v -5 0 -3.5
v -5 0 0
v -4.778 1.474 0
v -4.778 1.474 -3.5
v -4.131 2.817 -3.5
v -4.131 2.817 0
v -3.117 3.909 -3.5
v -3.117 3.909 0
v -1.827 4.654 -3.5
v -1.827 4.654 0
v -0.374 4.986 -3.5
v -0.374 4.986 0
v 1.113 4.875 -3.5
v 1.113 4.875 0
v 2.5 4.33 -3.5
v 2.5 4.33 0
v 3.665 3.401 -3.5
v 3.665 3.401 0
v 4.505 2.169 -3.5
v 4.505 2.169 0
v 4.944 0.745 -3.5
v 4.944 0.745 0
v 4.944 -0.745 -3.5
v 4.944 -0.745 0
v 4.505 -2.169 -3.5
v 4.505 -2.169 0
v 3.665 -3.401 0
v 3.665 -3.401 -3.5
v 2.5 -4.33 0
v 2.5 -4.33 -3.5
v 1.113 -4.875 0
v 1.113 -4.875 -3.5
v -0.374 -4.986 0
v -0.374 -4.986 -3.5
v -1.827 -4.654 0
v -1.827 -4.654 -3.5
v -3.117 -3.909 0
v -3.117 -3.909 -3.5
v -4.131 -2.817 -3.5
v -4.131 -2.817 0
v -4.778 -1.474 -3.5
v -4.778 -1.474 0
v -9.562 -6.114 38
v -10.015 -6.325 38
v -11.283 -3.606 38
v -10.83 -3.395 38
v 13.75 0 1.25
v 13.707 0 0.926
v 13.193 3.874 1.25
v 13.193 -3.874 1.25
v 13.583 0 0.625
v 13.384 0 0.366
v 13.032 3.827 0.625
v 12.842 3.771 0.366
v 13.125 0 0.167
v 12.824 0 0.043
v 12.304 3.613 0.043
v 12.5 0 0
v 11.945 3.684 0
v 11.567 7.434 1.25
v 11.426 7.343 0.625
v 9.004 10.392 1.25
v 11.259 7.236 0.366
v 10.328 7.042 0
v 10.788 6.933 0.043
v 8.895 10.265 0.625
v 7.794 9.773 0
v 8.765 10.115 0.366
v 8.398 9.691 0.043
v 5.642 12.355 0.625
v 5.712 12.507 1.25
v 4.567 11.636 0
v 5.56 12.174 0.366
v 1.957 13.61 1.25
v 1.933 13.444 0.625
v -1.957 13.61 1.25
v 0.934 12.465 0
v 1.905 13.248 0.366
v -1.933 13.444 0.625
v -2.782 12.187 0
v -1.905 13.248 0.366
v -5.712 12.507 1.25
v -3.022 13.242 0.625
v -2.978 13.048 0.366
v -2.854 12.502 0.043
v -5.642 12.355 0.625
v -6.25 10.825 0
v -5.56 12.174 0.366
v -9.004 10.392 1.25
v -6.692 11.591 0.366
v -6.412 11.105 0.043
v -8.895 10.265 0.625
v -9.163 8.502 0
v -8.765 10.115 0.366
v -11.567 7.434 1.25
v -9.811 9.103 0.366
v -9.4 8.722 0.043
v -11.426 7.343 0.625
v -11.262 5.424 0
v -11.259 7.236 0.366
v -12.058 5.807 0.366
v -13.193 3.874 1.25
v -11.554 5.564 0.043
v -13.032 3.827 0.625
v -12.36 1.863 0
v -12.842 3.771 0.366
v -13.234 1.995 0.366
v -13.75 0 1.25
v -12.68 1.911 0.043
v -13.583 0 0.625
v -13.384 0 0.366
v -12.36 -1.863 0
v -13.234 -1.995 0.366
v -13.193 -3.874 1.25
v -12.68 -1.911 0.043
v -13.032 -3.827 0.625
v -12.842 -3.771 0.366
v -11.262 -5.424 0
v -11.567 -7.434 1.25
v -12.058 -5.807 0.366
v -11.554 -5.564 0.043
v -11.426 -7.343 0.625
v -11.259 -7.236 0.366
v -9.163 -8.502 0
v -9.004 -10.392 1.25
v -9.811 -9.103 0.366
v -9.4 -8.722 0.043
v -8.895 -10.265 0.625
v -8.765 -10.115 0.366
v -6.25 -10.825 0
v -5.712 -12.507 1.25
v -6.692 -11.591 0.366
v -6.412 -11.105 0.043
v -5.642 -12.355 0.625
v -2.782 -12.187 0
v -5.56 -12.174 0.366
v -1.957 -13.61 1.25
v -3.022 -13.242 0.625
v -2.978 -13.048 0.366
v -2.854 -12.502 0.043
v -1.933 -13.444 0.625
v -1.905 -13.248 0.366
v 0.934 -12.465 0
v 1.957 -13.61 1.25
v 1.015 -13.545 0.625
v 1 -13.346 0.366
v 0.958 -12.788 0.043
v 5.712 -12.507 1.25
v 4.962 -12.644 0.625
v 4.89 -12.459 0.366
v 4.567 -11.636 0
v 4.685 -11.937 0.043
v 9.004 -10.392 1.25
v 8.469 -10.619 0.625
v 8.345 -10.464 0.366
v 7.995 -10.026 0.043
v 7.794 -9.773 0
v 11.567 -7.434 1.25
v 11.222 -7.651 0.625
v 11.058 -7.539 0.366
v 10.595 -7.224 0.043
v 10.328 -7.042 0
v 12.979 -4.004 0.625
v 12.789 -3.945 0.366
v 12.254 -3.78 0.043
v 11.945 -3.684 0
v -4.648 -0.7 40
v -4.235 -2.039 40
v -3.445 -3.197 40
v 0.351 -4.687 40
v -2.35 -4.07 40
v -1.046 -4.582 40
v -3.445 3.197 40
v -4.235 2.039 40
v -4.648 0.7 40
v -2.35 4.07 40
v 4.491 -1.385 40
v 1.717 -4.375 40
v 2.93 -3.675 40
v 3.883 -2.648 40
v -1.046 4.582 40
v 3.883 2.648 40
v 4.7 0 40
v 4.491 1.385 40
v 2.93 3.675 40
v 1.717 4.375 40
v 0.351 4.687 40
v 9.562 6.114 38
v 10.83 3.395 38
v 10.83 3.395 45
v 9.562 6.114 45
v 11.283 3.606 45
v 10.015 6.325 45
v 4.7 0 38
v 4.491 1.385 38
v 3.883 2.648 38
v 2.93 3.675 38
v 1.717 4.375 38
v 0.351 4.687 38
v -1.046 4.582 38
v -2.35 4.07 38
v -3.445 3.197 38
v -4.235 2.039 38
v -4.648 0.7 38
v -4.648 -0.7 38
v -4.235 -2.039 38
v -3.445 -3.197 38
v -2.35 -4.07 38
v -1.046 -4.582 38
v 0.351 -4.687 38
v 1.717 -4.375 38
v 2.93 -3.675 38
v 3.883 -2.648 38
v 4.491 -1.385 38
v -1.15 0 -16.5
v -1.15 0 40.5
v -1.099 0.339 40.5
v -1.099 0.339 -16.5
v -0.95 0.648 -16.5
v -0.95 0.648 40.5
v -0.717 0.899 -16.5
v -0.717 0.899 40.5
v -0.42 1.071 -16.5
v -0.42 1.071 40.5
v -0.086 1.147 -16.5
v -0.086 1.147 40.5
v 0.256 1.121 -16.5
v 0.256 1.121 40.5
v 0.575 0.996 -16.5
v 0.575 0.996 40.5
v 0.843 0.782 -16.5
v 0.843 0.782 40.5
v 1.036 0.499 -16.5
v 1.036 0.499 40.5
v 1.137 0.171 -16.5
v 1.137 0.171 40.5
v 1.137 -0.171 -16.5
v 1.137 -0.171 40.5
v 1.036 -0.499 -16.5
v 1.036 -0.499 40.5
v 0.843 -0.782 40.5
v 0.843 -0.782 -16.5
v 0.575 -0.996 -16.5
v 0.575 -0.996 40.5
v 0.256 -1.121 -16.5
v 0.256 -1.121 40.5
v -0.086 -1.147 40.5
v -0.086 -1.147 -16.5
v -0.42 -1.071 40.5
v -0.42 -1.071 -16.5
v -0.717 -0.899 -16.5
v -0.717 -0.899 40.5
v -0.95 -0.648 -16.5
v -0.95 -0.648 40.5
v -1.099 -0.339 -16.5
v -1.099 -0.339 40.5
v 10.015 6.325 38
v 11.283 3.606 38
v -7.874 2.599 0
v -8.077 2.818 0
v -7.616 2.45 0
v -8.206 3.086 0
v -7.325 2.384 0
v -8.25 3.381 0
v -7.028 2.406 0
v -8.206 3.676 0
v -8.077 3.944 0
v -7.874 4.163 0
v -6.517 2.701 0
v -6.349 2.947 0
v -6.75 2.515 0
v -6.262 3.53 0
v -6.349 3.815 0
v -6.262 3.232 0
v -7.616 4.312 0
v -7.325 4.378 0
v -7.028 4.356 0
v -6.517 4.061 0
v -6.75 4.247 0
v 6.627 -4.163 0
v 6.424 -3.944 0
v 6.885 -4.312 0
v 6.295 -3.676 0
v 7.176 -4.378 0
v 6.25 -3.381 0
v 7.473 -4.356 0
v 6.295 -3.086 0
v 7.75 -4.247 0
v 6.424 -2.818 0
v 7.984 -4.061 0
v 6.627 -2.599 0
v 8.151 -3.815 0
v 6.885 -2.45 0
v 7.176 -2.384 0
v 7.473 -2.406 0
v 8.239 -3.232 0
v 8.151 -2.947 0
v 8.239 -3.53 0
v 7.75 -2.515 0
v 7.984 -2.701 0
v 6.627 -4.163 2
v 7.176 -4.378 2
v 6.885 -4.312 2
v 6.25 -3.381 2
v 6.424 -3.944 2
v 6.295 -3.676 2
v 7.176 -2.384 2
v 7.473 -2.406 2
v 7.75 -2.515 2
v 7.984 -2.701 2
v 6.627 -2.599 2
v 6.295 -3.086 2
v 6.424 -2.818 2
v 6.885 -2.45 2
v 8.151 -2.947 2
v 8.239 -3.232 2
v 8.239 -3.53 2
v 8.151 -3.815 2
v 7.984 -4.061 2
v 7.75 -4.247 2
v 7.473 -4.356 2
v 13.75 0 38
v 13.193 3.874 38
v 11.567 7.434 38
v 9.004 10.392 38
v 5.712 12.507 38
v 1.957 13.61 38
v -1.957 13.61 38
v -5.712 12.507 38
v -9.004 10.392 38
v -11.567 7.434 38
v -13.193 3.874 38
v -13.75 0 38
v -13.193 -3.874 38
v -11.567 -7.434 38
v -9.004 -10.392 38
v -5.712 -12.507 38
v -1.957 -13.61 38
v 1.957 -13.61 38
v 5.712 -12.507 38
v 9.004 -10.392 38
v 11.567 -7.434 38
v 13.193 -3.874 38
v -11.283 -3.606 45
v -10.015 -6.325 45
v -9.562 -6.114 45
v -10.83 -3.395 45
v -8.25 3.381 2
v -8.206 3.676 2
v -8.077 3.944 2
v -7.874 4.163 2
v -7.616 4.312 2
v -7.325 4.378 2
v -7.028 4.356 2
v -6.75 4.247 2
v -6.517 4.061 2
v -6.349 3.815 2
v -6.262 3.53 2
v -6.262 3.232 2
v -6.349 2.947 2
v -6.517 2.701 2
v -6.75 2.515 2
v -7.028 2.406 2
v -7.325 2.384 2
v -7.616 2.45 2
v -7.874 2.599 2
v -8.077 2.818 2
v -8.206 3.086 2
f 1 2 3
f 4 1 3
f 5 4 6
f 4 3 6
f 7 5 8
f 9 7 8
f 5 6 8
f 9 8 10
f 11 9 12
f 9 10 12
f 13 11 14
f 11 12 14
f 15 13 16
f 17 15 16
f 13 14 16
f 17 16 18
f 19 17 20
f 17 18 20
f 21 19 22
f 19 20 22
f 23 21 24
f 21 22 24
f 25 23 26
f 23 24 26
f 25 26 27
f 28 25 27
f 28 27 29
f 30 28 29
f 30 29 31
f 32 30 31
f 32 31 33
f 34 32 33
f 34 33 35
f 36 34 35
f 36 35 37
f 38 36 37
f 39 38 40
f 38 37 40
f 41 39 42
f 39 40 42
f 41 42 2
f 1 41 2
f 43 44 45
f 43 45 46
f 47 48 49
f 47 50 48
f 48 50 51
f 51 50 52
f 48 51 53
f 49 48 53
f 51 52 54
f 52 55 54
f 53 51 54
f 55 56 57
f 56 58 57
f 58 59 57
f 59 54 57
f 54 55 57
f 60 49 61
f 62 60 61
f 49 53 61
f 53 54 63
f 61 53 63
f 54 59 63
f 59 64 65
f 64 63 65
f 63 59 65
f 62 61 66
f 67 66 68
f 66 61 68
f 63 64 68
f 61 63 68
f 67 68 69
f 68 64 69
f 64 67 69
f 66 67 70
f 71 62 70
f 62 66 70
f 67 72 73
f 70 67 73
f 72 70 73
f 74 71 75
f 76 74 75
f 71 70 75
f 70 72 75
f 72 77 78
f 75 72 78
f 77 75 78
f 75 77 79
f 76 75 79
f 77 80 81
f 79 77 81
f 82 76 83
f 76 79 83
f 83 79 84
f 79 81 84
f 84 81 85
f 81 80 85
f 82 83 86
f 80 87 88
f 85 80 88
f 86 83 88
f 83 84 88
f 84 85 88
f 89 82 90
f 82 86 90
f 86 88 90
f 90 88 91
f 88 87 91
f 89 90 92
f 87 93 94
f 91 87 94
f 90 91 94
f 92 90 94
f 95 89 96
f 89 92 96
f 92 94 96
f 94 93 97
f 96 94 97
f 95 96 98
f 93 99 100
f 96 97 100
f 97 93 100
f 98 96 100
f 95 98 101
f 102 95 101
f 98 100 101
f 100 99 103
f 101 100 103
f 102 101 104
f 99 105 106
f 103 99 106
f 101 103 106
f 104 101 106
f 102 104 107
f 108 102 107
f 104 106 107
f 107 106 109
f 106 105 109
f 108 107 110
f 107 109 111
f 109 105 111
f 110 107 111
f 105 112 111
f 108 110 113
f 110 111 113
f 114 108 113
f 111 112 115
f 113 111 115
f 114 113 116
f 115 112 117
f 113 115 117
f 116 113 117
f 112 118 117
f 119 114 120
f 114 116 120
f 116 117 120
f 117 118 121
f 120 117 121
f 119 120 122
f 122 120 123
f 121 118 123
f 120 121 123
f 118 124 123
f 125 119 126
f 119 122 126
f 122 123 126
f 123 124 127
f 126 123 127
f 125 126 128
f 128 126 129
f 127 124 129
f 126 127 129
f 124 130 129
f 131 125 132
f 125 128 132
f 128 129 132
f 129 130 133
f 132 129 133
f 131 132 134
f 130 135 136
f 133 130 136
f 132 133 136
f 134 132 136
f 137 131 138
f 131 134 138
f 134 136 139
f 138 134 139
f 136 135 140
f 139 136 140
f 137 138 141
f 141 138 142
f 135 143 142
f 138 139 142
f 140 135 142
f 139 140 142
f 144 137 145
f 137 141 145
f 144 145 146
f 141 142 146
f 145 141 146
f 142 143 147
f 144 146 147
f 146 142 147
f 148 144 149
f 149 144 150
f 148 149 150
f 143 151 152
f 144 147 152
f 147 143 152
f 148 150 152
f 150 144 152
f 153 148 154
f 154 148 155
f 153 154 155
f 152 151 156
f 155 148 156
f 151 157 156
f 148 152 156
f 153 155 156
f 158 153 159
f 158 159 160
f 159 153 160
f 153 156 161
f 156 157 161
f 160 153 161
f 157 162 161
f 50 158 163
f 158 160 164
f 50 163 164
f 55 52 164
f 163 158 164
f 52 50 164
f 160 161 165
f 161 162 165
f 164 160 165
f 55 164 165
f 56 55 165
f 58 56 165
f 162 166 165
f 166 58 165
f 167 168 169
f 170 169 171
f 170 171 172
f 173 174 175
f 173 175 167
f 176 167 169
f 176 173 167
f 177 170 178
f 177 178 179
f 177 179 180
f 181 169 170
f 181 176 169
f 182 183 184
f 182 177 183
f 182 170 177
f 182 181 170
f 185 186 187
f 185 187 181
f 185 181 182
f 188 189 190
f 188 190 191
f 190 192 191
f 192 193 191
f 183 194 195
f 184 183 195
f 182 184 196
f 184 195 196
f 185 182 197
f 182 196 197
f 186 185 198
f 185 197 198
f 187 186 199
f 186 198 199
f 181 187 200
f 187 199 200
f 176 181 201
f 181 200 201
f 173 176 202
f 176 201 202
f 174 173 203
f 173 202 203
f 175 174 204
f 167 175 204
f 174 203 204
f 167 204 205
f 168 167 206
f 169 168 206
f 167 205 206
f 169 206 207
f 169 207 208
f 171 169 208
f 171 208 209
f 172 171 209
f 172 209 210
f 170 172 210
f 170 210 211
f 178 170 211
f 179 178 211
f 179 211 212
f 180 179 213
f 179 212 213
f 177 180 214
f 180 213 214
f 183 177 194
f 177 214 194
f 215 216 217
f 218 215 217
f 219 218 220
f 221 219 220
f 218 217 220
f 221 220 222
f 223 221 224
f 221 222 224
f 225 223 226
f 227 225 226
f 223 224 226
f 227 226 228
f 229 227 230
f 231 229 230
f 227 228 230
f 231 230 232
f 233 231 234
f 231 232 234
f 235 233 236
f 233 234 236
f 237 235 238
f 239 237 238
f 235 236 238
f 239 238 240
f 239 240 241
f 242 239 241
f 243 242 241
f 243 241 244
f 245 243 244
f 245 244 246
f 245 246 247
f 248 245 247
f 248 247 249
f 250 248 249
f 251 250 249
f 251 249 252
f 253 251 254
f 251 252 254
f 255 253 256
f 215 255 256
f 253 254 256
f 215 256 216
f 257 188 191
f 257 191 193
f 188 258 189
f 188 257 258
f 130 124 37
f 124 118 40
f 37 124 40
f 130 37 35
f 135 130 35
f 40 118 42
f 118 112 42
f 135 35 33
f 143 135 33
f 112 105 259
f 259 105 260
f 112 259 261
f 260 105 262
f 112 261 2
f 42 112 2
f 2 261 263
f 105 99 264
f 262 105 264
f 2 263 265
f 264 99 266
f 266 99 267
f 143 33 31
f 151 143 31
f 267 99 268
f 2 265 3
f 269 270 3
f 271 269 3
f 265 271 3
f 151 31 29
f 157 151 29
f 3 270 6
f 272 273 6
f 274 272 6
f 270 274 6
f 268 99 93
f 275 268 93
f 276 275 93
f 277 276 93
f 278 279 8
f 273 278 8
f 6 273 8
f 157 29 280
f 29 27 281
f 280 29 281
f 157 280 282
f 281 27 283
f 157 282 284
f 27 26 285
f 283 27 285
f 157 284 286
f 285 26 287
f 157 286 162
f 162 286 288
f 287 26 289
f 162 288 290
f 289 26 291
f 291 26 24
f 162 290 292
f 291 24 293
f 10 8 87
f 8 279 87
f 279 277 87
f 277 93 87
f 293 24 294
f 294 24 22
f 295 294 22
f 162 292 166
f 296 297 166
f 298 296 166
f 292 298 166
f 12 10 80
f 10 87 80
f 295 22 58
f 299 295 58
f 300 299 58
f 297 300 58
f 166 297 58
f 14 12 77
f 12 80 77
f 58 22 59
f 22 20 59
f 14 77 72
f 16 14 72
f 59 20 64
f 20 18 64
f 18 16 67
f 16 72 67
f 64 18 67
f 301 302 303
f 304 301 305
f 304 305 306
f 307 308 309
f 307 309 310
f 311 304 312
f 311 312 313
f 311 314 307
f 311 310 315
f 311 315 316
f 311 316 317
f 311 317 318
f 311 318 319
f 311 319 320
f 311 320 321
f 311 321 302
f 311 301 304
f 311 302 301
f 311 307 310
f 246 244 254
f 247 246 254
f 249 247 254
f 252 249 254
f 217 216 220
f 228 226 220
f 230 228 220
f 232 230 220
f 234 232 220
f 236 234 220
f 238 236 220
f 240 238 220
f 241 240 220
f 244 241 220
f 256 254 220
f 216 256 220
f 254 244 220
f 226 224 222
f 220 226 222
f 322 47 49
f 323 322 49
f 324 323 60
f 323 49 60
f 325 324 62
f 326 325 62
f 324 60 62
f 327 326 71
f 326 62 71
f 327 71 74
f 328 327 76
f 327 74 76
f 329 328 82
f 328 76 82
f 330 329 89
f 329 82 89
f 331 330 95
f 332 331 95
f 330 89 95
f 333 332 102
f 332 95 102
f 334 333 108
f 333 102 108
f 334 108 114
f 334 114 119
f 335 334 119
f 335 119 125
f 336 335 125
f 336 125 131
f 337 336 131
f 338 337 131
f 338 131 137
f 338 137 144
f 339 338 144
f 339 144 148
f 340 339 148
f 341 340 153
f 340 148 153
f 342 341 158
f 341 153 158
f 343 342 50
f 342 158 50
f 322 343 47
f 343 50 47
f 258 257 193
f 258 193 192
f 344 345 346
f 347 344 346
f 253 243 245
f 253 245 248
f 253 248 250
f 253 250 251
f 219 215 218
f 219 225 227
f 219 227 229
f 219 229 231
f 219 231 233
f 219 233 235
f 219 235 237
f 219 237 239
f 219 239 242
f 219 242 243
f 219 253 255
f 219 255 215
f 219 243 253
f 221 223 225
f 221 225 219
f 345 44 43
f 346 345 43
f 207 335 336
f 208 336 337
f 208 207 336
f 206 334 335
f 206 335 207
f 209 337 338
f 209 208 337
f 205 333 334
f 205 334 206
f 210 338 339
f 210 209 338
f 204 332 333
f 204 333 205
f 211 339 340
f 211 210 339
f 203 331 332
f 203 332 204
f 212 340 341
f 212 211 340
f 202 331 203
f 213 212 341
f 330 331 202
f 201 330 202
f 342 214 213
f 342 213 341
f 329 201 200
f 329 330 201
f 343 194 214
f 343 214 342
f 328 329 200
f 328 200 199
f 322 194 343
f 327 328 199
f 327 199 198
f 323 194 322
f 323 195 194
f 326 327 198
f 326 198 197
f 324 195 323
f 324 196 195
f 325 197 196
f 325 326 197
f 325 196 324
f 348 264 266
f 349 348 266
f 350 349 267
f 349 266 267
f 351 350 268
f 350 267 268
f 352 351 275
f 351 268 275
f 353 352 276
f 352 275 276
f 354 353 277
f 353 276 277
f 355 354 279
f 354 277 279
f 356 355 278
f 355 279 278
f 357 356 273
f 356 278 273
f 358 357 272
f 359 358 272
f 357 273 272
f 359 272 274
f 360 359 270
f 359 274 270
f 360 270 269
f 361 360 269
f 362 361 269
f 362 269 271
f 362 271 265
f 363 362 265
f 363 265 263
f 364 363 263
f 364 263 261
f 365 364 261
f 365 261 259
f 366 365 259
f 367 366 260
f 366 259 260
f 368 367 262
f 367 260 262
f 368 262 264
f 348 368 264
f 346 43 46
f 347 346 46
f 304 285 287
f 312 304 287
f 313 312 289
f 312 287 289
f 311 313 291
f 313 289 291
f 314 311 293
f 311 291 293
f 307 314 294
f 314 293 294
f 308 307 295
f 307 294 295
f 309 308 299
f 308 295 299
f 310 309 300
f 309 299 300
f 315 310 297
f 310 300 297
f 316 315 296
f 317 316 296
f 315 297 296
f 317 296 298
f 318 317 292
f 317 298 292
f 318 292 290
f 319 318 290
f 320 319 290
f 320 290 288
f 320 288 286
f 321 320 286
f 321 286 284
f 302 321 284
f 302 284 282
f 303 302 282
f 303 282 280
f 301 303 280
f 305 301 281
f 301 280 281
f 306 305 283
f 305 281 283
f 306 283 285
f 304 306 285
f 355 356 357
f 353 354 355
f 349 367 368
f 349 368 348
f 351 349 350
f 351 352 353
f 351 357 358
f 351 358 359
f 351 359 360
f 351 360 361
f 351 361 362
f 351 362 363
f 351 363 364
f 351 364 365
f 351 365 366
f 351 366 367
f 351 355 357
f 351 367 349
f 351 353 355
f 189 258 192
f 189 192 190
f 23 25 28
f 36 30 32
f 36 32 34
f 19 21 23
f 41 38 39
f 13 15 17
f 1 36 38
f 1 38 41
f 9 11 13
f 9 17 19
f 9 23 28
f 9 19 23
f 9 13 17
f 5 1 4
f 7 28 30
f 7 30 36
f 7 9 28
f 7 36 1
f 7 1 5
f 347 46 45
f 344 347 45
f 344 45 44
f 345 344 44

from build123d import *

# Parameters (mm, degrees)
SKIZZE2_R                            = 13.75
AUFSATZ_LINEAR_AUSTRAGEN1_DEPTH      = 38
SKIZZE3_R                            = 5
AUFSATZ_LINEAR_AUSTRAGEN2_DEPTH      = 3.5
SKIZZE4_R                            = 4.7
AUFSATZ_LINEAR_AUSTRAGEN3_DEPTH      = 2
AUFSATZ_LINEAR_AUSTRAGEN4_DEPTH      = 13
AUFSATZ_LINEAR_AUSTRAGEN4_DEPTH_BACK = 44
SKIZZE5_R                            = 1.15
SKIZZE6_R                            = 1
SCHNITT_LINEAR_AUSTRAGEN1_DEPTH      = 2
AUFSATZ_LINEAR_AUSTRAGEN5_DEPTH      = 7
AUFSATZ_LINEAR_AUSTRAGEN5_2_DEPTH    = 7
VERRUNDUNG1_R                        = 1.25


with BuildPart() as part:
    # Skizze2 → Aufsatz-Linear austragen1 (new body)
    with BuildSketch(Plane.XY):
        Circle(SKIZZE2_R)
    extrude(amount=AUFSATZ_LINEAR_AUSTRAGEN1_DEPTH)

    # Skizze3 → Aufsatz-Linear austragen2 (add)
    with BuildSketch(Plane(origin=(0, 0, 0), x_dir=(-1, 0, 0), z_dir=(0, 0, -1))):
        Circle(SKIZZE3_R)
    extrude(amount=AUFSATZ_LINEAR_AUSTRAGEN2_DEPTH)

    # Skizze4 → Aufsatz-Linear austragen3 (add)
    with BuildSketch(Plane.XY.offset(38)):
        Circle(SKIZZE4_R)
    extrude(amount=AUFSATZ_LINEAR_AUSTRAGEN3_DEPTH)

    # Skizze6 → Schnitt-Linear austragen1 (cut)
    with BuildSketch(Plane(origin=(0, 0, 0), x_dir=(-1, 0, 0), z_dir=(0, 0, -1))):
        with Locations((7.250462296, 3.380946094)):
            Circle(SKIZZE6_R)
        with Locations((-7.250462296, -3.380946094)):
            Circle(SKIZZE6_R)
    extrude(amount=-SCHNITT_LINEAR_AUSTRAGEN1_DEPTH, mode=Mode.SUBTRACT)

    # Verrundung1
    verrundung1_edges = [part.edges().sort_by_distance(p)[0] for p in [
        (-13.75, 0, 0),
    ]]
    fillet(verrundung1_edges, radius=VERRUNDUNG1_R)


with BuildPart() as body_2:
    # Skizze5 → Aufsatz-Linear austragen4 (new, two sides: drawn at the far end of the back side and taken through both)
    with BuildSketch(Plane(origin=(0, 0, -3.5), x_dir=(-1, 0, 0), z_dir=(0, 0, -1)).offset(-AUFSATZ_LINEAR_AUSTRAGEN4_DEPTH_BACK)):
        Circle(SKIZZE5_R)
    extrude(amount=AUFSATZ_LINEAR_AUSTRAGEN4_DEPTH + AUFSATZ_LINEAR_AUSTRAGEN4_DEPTH_BACK)


with BuildPart() as body_3:
    # Skizze7 → Aufsatz-Linear austragen5 (new body)
    with BuildSketch(Plane.XY.offset(38)):
        Polygon((11.28304389, 3.606302895), (10.829889997, 3.394993764), (9.562035212, 6.113917125), (10.015189105, 6.325226256), align=None)
    extrude(amount=AUFSATZ_LINEAR_AUSTRAGEN5_DEPTH)


with BuildPart() as body_4:
    # Skizze7 → Aufsatz-Linear austragen5 2 (new body)
    with BuildSketch(Plane.XY.offset(38)):
        Polygon((-10.015189105, -6.325226256), (-9.562035212, -6.113917125), (-10.829889997, -3.394993764), (-11.28304389, -3.606302895), align=None)
    extrude(amount=AUFSATZ_LINEAR_AUSTRAGEN5_2_DEPTH)


solid = Compound([part.part, body_2.part, body_3.part, body_4.part])
